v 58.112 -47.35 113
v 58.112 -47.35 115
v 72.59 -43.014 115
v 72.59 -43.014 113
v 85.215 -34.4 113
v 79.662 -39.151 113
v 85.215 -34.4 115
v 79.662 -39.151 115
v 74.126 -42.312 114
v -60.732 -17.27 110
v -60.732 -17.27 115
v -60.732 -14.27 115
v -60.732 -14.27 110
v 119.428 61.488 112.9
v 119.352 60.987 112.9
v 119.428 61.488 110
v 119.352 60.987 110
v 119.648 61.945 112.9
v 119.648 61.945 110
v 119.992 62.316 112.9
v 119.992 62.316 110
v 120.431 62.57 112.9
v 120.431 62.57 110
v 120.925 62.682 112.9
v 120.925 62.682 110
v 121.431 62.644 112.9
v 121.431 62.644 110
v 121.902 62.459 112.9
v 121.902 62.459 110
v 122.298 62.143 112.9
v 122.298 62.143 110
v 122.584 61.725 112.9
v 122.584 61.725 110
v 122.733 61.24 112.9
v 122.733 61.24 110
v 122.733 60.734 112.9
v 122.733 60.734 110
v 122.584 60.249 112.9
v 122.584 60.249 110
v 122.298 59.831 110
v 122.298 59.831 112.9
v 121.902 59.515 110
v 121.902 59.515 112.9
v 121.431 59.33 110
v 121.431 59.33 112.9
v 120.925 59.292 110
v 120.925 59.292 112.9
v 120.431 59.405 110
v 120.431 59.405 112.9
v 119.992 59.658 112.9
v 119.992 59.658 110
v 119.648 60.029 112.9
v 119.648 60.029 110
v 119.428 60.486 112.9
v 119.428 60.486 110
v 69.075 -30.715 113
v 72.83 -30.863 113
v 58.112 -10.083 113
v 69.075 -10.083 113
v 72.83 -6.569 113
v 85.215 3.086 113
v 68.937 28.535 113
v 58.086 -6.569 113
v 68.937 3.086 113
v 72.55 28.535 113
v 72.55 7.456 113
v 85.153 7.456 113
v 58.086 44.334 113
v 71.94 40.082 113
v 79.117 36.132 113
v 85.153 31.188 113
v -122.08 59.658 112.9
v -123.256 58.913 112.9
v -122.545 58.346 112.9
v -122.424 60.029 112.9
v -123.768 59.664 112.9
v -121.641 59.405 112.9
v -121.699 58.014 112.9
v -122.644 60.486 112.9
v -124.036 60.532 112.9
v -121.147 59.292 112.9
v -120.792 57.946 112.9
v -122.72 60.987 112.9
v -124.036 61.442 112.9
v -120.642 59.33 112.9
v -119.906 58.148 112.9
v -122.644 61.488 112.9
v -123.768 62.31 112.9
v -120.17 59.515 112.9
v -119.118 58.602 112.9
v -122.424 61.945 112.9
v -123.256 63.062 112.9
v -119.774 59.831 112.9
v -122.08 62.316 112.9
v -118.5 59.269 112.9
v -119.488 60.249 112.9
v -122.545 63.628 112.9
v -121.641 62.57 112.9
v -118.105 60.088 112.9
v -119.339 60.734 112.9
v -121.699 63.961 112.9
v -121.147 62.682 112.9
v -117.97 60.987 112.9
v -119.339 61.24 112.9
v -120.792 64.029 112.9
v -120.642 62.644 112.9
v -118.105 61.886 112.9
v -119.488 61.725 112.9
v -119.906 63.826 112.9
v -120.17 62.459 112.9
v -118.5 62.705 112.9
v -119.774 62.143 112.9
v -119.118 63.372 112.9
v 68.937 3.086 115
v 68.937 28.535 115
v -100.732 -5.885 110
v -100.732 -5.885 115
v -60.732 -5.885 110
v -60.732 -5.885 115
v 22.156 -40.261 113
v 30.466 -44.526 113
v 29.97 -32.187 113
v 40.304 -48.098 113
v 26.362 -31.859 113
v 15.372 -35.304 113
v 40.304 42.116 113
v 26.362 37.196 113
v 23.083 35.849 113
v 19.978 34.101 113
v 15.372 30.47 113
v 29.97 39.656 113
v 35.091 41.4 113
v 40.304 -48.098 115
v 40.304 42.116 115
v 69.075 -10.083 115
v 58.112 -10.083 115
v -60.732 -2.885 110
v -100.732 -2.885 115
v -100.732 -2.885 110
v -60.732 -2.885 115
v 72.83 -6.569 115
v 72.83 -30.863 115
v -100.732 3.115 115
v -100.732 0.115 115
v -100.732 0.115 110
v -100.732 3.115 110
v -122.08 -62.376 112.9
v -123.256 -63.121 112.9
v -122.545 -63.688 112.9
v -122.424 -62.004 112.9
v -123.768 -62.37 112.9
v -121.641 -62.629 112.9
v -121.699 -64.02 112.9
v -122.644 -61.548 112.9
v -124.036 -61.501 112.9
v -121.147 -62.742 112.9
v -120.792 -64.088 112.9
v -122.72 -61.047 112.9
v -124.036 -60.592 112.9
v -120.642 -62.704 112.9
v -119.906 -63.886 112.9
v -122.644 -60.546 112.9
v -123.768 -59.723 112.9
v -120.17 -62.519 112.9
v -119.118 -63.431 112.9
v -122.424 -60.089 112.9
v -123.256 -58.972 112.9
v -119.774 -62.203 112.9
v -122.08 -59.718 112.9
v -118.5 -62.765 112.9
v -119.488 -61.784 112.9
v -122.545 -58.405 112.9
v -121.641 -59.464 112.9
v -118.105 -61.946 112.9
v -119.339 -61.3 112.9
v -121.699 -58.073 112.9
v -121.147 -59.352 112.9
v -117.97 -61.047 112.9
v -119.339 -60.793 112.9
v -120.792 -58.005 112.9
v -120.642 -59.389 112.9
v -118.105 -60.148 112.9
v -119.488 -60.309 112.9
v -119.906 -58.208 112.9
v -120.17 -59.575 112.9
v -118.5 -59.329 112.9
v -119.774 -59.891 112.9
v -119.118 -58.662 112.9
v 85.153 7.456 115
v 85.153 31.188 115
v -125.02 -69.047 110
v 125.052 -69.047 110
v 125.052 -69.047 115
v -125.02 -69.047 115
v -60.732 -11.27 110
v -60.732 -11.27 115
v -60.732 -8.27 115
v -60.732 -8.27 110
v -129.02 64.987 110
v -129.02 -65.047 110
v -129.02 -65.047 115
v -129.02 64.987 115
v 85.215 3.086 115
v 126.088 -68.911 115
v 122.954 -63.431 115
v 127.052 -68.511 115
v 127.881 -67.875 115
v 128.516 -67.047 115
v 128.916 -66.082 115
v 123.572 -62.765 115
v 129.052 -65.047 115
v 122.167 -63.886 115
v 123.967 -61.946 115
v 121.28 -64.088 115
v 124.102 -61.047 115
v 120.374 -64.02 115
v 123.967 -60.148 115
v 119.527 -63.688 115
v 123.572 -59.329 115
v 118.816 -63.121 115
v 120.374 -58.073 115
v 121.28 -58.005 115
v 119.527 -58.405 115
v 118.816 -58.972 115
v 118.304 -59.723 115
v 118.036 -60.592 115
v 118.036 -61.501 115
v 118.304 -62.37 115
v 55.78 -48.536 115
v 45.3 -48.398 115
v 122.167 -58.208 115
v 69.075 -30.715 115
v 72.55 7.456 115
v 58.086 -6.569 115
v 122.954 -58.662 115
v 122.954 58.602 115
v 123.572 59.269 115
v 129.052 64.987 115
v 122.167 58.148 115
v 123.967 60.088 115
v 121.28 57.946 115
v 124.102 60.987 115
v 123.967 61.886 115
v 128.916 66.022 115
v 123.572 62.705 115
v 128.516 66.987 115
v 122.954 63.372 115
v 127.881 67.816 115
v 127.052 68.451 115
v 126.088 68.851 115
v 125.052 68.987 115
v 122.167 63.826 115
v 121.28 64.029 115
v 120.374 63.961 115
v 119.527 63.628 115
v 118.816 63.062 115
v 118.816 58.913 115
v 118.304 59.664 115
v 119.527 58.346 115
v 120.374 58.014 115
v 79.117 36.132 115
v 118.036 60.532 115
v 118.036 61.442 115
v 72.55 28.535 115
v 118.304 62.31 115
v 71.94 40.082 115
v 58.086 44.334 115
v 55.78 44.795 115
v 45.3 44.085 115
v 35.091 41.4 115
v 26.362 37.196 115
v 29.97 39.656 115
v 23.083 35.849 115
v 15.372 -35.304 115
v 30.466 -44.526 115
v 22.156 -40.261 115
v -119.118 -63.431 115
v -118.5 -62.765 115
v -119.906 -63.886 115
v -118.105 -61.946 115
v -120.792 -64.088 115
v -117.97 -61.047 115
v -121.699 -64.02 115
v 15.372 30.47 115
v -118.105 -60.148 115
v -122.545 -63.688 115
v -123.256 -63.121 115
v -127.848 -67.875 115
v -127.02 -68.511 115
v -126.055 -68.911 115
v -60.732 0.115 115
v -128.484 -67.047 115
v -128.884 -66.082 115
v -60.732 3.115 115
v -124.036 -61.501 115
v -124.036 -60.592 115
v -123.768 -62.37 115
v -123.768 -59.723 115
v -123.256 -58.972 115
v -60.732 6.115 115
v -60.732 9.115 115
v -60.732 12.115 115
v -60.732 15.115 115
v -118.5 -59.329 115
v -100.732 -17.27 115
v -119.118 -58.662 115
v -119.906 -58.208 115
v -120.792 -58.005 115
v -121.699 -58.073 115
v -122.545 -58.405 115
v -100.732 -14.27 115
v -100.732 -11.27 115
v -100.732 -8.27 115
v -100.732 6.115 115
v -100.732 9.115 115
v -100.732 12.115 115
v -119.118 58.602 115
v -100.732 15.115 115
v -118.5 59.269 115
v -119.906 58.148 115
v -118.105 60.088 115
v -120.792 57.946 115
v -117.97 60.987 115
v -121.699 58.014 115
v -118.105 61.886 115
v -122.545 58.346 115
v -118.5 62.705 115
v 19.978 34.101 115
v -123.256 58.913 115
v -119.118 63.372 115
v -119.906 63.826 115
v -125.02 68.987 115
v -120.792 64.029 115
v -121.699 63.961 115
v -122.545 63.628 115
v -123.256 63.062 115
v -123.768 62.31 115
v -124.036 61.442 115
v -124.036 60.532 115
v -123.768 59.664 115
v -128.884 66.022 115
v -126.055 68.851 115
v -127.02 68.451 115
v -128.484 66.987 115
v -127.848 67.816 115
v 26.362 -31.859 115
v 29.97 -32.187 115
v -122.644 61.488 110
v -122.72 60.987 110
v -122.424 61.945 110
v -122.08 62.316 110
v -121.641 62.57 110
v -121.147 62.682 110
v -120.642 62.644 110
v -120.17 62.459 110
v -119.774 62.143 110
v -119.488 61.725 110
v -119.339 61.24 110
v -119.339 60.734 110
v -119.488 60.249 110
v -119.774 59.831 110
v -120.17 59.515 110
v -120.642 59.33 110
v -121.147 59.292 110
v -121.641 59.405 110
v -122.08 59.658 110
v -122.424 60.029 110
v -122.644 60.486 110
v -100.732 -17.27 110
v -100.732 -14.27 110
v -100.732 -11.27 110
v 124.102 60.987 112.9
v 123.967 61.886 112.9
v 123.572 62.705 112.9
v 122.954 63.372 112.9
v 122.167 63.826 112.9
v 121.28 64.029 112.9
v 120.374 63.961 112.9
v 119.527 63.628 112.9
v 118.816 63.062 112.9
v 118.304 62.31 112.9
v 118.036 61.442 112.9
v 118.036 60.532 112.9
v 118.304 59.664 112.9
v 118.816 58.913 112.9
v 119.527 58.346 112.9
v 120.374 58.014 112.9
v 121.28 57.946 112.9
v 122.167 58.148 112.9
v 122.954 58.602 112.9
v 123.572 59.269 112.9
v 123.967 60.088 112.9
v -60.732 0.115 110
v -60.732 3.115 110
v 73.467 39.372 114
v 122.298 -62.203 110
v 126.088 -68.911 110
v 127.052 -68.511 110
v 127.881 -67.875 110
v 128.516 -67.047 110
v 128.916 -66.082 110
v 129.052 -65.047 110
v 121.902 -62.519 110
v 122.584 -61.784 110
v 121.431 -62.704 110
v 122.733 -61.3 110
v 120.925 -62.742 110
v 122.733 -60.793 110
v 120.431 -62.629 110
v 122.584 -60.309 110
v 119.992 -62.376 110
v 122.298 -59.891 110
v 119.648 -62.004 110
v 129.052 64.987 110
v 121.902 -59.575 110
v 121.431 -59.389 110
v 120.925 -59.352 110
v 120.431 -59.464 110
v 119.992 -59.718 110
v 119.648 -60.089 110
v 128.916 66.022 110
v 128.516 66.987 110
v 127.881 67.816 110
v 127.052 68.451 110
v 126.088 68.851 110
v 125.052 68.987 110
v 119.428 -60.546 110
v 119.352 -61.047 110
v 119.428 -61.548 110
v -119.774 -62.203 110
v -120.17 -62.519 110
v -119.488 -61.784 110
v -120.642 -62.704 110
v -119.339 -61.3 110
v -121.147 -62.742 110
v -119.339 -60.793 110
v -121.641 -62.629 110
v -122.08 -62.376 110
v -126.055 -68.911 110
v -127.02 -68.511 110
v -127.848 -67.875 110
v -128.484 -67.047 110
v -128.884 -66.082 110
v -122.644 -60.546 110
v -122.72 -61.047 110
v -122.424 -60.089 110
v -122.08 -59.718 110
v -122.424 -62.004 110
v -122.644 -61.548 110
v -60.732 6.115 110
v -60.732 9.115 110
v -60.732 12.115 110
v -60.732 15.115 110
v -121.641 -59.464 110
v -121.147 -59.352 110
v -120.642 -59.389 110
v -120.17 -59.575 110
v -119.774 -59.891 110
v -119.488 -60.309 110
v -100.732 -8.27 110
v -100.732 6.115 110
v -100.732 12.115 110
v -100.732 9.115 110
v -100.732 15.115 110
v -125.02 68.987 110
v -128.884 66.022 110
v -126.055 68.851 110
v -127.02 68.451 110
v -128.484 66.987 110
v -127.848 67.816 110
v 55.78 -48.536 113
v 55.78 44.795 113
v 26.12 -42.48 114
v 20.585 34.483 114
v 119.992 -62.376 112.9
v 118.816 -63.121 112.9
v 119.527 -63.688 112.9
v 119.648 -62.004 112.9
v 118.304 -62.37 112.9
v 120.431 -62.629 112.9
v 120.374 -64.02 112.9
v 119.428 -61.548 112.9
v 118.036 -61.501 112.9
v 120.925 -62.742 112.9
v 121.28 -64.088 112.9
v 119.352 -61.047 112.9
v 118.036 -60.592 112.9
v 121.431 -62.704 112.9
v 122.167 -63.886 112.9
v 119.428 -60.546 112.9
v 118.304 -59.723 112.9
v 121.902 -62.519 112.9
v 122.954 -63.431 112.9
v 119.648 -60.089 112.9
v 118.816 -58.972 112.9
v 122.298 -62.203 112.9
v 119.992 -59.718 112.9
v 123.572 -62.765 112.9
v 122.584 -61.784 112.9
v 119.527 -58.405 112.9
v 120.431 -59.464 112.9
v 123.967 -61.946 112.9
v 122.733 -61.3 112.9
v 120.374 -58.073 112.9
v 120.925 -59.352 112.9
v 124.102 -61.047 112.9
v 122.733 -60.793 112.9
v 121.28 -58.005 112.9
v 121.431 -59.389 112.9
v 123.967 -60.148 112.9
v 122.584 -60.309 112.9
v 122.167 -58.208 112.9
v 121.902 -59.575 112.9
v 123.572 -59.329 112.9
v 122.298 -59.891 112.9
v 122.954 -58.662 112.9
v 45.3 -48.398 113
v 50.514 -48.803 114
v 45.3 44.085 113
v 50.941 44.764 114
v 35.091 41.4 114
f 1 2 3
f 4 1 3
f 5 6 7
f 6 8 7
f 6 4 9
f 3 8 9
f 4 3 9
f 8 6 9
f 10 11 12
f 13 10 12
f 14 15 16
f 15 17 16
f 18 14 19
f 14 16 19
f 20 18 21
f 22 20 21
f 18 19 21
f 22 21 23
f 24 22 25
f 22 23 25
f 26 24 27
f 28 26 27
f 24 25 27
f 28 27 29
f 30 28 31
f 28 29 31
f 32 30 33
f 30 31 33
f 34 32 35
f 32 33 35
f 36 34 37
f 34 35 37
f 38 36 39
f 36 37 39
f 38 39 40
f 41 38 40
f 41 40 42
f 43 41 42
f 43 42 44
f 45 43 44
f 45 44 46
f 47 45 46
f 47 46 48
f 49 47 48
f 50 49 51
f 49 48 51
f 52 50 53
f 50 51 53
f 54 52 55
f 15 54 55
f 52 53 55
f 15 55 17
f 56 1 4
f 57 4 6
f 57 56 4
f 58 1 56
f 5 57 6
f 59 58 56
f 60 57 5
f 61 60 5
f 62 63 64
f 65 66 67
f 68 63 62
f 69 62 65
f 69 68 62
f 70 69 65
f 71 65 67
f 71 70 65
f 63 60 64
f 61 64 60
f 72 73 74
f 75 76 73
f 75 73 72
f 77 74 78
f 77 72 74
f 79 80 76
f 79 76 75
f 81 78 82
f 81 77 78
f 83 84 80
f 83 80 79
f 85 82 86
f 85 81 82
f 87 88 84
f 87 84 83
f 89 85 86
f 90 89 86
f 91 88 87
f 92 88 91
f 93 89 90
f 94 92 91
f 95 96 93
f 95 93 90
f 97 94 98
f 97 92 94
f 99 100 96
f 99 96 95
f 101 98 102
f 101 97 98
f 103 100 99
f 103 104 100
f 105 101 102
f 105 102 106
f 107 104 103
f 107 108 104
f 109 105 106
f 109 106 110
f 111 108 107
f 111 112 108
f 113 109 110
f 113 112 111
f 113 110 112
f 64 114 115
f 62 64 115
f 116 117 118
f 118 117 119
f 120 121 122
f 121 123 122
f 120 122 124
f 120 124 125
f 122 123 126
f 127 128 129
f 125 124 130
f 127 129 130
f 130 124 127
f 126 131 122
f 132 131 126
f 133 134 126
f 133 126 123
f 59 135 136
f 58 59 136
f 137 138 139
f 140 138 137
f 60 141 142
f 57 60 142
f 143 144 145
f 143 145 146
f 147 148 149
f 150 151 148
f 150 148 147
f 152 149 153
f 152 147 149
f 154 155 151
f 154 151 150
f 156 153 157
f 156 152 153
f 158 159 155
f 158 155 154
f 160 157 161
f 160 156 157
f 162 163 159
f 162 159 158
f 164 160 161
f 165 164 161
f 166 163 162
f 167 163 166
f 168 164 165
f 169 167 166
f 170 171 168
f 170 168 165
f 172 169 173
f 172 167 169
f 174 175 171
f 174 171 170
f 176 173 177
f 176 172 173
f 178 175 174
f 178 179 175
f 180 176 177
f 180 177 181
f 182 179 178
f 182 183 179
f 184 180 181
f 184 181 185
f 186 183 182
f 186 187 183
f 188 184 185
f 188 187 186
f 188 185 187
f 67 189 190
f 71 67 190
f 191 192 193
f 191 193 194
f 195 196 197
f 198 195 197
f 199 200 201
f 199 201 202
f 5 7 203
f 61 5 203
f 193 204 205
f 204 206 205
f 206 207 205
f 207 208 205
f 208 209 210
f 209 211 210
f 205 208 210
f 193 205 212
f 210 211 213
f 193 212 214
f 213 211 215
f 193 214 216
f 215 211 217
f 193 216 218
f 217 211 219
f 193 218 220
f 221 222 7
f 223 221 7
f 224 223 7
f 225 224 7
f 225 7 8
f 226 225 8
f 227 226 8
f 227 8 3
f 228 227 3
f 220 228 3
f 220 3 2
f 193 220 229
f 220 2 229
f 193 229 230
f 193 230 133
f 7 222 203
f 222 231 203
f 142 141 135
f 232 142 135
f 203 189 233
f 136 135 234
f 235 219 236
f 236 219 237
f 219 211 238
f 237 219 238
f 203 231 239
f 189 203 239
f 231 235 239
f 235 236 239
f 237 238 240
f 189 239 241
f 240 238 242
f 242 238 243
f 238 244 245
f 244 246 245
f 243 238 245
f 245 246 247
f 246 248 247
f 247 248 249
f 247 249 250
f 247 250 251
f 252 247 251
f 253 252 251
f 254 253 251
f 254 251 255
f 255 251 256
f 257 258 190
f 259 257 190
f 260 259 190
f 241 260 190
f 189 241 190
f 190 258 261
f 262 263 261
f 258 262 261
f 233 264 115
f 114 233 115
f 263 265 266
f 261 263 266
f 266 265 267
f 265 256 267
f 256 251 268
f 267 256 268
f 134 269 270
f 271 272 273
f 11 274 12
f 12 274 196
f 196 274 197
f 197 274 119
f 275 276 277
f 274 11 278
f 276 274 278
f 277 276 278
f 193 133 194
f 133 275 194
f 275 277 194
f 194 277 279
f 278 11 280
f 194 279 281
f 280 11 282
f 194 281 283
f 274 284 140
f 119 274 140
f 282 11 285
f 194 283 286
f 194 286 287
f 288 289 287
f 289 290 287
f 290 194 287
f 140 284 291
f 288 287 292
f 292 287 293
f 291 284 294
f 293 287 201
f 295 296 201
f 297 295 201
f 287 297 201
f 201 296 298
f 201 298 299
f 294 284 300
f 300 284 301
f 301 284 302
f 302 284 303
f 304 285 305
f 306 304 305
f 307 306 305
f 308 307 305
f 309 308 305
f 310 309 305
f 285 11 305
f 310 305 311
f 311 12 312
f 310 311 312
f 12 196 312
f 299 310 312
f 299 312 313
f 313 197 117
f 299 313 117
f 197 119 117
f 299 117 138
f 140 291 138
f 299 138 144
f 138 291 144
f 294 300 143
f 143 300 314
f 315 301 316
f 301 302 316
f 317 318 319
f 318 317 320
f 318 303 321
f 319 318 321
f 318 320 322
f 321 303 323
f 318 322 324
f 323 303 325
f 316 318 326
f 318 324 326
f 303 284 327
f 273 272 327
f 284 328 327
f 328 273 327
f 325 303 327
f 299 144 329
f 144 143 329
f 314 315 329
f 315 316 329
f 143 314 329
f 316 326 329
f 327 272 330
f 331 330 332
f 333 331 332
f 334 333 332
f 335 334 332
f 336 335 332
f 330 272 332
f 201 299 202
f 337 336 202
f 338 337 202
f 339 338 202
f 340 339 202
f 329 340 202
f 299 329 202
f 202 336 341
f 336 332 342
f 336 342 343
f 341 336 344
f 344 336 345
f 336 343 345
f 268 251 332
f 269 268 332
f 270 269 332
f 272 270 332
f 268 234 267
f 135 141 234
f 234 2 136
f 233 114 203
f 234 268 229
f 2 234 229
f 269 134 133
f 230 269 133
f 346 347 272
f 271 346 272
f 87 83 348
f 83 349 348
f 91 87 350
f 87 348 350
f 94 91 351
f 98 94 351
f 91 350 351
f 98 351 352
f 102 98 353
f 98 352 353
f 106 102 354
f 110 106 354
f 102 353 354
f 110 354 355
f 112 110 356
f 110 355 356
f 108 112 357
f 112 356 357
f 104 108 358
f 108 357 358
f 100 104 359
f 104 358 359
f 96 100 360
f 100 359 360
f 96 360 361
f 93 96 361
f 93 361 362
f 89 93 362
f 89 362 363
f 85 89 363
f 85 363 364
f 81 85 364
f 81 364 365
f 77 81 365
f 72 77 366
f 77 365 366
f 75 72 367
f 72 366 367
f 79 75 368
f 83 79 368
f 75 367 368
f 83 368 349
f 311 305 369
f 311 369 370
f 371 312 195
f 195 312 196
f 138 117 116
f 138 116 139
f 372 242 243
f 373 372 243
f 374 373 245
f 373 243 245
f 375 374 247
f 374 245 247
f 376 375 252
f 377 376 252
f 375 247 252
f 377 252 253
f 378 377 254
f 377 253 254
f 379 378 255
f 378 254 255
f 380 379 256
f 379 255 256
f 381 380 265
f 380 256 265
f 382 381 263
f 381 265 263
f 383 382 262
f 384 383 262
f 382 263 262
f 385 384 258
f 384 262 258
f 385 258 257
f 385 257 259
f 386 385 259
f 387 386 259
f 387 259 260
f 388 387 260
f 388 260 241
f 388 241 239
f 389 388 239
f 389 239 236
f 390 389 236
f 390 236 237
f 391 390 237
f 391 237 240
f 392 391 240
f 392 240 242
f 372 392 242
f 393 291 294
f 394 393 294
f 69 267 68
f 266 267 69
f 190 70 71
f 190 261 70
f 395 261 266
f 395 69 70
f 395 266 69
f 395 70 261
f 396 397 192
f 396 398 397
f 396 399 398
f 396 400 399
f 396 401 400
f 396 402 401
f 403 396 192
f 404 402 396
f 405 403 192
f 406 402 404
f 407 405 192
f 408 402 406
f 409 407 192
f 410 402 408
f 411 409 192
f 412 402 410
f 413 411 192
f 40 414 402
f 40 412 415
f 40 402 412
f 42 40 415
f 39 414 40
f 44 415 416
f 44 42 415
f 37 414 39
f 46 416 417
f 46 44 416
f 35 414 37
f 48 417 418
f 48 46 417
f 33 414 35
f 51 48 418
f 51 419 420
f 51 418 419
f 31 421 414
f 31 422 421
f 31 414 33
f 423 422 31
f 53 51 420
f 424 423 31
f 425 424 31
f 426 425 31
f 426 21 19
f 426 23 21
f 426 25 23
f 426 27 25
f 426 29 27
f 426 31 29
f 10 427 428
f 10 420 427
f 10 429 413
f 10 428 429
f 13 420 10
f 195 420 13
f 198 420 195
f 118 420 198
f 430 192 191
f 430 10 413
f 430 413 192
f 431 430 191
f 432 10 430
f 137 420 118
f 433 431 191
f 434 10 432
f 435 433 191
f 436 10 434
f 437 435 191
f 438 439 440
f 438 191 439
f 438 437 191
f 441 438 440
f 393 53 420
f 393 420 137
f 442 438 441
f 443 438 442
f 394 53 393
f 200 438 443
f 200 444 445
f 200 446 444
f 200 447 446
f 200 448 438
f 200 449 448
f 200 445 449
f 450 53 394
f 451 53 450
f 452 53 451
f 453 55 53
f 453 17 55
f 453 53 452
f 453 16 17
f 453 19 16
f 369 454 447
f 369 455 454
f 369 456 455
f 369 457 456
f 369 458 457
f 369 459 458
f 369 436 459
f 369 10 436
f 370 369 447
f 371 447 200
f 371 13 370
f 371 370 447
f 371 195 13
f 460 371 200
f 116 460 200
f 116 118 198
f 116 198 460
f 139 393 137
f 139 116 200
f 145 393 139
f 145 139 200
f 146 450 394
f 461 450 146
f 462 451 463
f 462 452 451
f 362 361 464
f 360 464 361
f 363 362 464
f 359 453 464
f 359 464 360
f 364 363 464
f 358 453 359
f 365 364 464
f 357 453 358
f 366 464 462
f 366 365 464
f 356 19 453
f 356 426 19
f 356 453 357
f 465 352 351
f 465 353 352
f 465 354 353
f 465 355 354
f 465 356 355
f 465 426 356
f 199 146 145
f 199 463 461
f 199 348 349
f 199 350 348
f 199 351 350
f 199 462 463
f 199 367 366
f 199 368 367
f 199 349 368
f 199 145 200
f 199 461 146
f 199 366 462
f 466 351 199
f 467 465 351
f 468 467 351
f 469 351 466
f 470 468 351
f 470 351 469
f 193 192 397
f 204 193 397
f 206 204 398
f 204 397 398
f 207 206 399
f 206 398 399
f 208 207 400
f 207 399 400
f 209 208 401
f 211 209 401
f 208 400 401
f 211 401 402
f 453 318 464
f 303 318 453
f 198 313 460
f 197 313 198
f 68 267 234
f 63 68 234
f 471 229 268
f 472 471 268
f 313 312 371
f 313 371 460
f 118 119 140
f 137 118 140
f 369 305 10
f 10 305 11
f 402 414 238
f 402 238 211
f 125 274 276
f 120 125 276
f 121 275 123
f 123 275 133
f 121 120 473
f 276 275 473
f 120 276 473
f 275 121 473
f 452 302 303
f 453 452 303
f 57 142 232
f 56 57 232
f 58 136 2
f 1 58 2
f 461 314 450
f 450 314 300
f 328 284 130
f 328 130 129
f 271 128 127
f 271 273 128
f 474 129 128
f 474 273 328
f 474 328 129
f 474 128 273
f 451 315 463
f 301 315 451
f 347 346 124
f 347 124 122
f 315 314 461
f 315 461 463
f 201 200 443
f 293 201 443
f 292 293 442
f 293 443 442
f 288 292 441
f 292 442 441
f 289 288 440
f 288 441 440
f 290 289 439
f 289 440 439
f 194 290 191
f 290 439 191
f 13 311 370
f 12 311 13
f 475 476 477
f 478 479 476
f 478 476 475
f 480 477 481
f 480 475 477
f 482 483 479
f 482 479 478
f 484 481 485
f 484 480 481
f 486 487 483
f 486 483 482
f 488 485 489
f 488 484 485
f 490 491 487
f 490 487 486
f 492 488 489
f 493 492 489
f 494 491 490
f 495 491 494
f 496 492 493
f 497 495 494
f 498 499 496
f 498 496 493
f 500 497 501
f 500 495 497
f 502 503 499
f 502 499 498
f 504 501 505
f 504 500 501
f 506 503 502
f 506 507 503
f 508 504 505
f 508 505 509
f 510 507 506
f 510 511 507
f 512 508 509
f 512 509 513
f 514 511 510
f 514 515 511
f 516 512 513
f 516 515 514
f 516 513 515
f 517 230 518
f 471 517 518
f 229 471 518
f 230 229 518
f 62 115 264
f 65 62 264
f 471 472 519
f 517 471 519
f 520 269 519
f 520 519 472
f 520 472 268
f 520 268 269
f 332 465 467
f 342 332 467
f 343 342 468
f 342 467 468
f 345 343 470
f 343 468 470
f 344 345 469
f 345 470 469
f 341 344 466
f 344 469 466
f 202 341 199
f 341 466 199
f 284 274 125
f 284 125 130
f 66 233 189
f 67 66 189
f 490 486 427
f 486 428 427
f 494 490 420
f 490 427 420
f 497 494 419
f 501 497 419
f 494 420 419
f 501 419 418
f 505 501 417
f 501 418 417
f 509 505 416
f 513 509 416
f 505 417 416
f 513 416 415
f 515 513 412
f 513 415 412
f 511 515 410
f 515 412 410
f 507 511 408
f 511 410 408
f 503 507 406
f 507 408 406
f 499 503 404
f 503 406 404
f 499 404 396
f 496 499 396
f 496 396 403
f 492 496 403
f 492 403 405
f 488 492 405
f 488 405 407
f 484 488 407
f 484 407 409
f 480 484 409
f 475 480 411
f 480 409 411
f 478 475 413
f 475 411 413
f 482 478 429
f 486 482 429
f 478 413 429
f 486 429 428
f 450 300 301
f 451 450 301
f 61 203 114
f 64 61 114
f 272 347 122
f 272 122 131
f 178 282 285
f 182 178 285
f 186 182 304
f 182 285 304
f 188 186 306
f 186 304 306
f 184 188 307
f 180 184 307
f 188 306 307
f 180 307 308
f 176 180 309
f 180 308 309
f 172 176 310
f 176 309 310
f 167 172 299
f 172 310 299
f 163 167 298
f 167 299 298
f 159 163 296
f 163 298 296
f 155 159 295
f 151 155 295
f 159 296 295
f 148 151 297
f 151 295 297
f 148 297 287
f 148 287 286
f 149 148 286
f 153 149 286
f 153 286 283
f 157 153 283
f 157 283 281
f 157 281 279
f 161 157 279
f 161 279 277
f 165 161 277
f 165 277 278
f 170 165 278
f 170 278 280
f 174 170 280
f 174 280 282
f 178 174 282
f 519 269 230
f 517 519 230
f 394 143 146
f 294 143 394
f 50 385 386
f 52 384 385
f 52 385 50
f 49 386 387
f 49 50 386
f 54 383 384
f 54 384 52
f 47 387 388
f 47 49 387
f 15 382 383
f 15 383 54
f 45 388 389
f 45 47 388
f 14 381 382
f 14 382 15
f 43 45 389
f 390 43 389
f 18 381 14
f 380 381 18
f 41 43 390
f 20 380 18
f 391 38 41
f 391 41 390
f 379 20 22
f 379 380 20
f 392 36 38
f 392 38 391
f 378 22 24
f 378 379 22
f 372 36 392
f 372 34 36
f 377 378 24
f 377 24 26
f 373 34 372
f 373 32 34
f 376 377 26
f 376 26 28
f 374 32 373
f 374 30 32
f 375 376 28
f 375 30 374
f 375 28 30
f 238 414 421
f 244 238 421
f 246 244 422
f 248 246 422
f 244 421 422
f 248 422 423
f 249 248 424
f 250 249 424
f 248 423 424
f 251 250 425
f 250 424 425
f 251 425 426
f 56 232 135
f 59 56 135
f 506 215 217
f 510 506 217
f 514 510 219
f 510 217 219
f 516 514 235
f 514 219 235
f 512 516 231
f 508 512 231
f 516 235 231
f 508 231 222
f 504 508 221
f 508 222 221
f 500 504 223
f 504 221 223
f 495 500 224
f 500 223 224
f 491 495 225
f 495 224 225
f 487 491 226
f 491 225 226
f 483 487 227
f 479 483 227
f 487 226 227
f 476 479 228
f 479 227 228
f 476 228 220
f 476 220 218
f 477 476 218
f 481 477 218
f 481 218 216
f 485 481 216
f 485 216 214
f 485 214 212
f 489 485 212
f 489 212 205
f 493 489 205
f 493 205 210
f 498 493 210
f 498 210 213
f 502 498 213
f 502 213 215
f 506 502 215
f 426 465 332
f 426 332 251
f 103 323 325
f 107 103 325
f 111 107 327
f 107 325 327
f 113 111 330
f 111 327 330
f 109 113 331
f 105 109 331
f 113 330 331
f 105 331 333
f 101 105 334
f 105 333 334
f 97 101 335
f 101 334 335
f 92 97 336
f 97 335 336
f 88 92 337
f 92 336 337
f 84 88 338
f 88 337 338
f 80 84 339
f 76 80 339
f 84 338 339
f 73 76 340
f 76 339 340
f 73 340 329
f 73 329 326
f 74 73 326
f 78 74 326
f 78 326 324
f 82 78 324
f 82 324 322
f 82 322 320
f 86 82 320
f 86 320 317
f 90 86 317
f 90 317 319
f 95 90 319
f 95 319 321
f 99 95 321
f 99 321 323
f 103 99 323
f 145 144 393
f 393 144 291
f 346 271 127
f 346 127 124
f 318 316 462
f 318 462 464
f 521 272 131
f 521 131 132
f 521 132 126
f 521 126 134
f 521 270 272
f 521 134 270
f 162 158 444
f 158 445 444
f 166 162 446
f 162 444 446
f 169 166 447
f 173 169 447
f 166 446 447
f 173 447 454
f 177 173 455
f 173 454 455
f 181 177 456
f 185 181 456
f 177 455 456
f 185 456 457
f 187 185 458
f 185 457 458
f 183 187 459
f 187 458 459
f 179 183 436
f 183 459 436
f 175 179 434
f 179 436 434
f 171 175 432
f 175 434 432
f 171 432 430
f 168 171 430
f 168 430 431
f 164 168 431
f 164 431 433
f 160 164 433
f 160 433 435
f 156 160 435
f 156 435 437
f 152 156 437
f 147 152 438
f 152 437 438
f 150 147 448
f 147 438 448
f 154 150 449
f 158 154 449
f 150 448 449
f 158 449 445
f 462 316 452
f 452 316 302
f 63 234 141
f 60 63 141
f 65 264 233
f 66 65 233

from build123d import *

# Parameters (mm, degrees)
PAD012_DEPTH     = 5
SKETCH028_W      = 40
SKETCH028_H      = 3
POCKET005_DEPTH  = 5
POCKET007_DEPTH  = 2
HOLE_D           = 3.4
HOLE_DEPTH       = 25
HOLE_CBORE_D     = 6.1
HOLE_CBORE_DEPTH = 2.1


with BuildPart() as part:
    # Sketch017 → Pad012 (new body)
    with BuildSketch(Plane.XY):
        with BuildLine():
            Line((-125.019865, 68.987077), (125.0523, 68.987077))
            ThreePointArc((129.0523, 64.987077), (127.880727, 67.815504), (125.0523, 68.987077))
            Line((129.0523, 64.987077), (129.0523, -65.046829))
            ThreePointArc((125.0523, -69.046829), (127.880727, -67.875256), (129.0523, -65.046829))
            Line((125.0523, -69.046829), (-125.019865, -69.046829))
            ThreePointArc((-129.019865, -65.046829), (-127.848292, -67.875256), (-125.019865, -69.046829))
            Line((-129.019865, -65.046829), (-129.019865, 64.987077))
            ThreePointArc((-125.019865, 68.987077), (-127.848292, 67.815504), (-129.019865, 64.987077))
        make_face()
    extrude(amount=PAD012_DEPTH)

    # Sketch028 (on Face10 of Pad012) → Pocket005 (cut)
    with BuildSketch(Plane.XY.offset(5)):
        with Locations((-80.731997, 13.615229)):
            Rectangle(SKETCH028_W, SKETCH028_H)
        with Locations((-80.731997, 7.615229)):
            Rectangle(SKETCH028_W, SKETCH028_H)
        with Locations((-80.731997, 1.615229)):
            Rectangle(SKETCH028_W, SKETCH028_H)
        with Locations((-80.731997, -4.384771)):
            Rectangle(SKETCH028_W, SKETCH028_H)
        with Locations((-80.731997, -9.76974)):
            Rectangle(SKETCH028_W, SKETCH028_H)
        with Locations((-80.731997, -15.76974)):
            Rectangle(SKETCH028_W, SKETCH028_H)
    extrude(amount=-POCKET005_DEPTH, mode=Mode.SUBTRACT)

    # Sketch030 (on Face5 of Pocket005) → Pocket007 (cut)
    with BuildSketch(Plane.XY.offset(5)):
        with BuildLine():
            add(Edge.make_bspline(
                [(15.3717, 30.4705), (20.304277, 35.132774), (26.3615, 37.1956)],
                knots=[0, 0, 0, 1, 1, 1], degree=2))
            Line((26.3615, 37.1956), (26.3615, -31.859221))
            Line((26.3615, -31.859221), (29.97, -32.187271))
            Line((29.97, -32.187271), (29.97, 39.656))
            add(Edge.make_bspline(
                [(29.97, 39.656), (35.044575, 41.913307), (40.3036, 42.1163)],
                knots=[0, 0, 0, 1, 1, 1], degree=2))
            Line((40.3036, 42.1163), (40.3036, -48.0978))
            add(Edge.make_bspline(
                [(15.3717, -35.3038), (24.402502, -43.259792), (40.3036, -48.0978)],
                knots=[0, 0, 0, 1, 1, 1], degree=2))
            Line((15.3717, -35.3038), (15.3717, 30.4705))
        make_face()
        with BuildLine():
            add(Edge.make_bspline(
                [(45.3002, 44.0847), (51.3415, 45.0886), (55.7798, 44.794849)],
                knots=[0, 0, 0, 1, 1, 1], degree=2))
            Line((45.3002, 44.0847), (45.3002, -48.3978))
            add(Edge.make_bspline(
                [(45.3002, -48.3978), (50.487595, -49.138817), (55.7798, -48.5358)],
                knots=[0, 0, 0, 1, 1, 1], degree=2))
            Line((55.7798, -48.5358), (55.7798, 44.794849))
        make_face()
        with BuildLine():
            Line((58.0863, 44.3344), (58.0863, -6.569482))
            Line((58.0863, -6.569482), (72.830238, -6.569482))
            Line((72.830238, -6.569482), (72.830238, -30.86281))
            Line((72.830238, -30.86281), (69.074577, -30.715408))
            Line((69.074577, -30.715408), (69.074577, -10.083365))
            Line((69.074577, -10.083365), (58.1125, -10.083365))
            Line((58.1125, -10.083365), (58.1125, -47.3498))
            add(Edge.make_bspline(
                [(58.1125, -47.3498), (76.588104, -43.74934), (85.2152, -34.4005)],
                knots=[0, 0, 0, 1, 1, 1], degree=2))
            Line((85.2152, -34.4005), (85.2152, 3.085874))
            Line((85.2152, 3.085874), (68.937401, 3.085874))
            Line((68.937401, 3.085874), (68.937401, 28.534903))
            Line((68.937401, 28.534903), (69.012573, 28.534903))
            Line((69.012573, 28.534903), (72.55024, 28.534903))
            Line((72.55024, 28.534903), (72.55024, 7.45628))
            Line((72.55024, 7.45628), (85.1532, 7.45628))
            Line((85.1532, 7.45628), (85.1532, 31.1882))
            add(Edge.make_bspline(
                [(58.0863, 44.3344), (75.314171, 40.982338), (85.1532, 31.1882)],
                knots=[0, 0, 0, 1, 1, 1], degree=2))
        make_face()
    extrude(amount=-POCKET007_DEPTH, mode=Mode.SUBTRACT)

    # Hole
    with Locations(Plane.XY.offset(5)):
        with Locations((121.0523, 60.987077), (-121.019865, 60.987077), (-121.019865, -61.046829), (121.0523, -61.046829)):
            CounterBoreHole(HOLE_D / 2, HOLE_CBORE_D / 2, HOLE_CBORE_DEPTH, depth=HOLE_DEPTH)


with BuildPart() as part_1:
    # Body003 placement: moved
    add(part.part.moved(Location((0, 0, 110))))


solid = part_1.part
